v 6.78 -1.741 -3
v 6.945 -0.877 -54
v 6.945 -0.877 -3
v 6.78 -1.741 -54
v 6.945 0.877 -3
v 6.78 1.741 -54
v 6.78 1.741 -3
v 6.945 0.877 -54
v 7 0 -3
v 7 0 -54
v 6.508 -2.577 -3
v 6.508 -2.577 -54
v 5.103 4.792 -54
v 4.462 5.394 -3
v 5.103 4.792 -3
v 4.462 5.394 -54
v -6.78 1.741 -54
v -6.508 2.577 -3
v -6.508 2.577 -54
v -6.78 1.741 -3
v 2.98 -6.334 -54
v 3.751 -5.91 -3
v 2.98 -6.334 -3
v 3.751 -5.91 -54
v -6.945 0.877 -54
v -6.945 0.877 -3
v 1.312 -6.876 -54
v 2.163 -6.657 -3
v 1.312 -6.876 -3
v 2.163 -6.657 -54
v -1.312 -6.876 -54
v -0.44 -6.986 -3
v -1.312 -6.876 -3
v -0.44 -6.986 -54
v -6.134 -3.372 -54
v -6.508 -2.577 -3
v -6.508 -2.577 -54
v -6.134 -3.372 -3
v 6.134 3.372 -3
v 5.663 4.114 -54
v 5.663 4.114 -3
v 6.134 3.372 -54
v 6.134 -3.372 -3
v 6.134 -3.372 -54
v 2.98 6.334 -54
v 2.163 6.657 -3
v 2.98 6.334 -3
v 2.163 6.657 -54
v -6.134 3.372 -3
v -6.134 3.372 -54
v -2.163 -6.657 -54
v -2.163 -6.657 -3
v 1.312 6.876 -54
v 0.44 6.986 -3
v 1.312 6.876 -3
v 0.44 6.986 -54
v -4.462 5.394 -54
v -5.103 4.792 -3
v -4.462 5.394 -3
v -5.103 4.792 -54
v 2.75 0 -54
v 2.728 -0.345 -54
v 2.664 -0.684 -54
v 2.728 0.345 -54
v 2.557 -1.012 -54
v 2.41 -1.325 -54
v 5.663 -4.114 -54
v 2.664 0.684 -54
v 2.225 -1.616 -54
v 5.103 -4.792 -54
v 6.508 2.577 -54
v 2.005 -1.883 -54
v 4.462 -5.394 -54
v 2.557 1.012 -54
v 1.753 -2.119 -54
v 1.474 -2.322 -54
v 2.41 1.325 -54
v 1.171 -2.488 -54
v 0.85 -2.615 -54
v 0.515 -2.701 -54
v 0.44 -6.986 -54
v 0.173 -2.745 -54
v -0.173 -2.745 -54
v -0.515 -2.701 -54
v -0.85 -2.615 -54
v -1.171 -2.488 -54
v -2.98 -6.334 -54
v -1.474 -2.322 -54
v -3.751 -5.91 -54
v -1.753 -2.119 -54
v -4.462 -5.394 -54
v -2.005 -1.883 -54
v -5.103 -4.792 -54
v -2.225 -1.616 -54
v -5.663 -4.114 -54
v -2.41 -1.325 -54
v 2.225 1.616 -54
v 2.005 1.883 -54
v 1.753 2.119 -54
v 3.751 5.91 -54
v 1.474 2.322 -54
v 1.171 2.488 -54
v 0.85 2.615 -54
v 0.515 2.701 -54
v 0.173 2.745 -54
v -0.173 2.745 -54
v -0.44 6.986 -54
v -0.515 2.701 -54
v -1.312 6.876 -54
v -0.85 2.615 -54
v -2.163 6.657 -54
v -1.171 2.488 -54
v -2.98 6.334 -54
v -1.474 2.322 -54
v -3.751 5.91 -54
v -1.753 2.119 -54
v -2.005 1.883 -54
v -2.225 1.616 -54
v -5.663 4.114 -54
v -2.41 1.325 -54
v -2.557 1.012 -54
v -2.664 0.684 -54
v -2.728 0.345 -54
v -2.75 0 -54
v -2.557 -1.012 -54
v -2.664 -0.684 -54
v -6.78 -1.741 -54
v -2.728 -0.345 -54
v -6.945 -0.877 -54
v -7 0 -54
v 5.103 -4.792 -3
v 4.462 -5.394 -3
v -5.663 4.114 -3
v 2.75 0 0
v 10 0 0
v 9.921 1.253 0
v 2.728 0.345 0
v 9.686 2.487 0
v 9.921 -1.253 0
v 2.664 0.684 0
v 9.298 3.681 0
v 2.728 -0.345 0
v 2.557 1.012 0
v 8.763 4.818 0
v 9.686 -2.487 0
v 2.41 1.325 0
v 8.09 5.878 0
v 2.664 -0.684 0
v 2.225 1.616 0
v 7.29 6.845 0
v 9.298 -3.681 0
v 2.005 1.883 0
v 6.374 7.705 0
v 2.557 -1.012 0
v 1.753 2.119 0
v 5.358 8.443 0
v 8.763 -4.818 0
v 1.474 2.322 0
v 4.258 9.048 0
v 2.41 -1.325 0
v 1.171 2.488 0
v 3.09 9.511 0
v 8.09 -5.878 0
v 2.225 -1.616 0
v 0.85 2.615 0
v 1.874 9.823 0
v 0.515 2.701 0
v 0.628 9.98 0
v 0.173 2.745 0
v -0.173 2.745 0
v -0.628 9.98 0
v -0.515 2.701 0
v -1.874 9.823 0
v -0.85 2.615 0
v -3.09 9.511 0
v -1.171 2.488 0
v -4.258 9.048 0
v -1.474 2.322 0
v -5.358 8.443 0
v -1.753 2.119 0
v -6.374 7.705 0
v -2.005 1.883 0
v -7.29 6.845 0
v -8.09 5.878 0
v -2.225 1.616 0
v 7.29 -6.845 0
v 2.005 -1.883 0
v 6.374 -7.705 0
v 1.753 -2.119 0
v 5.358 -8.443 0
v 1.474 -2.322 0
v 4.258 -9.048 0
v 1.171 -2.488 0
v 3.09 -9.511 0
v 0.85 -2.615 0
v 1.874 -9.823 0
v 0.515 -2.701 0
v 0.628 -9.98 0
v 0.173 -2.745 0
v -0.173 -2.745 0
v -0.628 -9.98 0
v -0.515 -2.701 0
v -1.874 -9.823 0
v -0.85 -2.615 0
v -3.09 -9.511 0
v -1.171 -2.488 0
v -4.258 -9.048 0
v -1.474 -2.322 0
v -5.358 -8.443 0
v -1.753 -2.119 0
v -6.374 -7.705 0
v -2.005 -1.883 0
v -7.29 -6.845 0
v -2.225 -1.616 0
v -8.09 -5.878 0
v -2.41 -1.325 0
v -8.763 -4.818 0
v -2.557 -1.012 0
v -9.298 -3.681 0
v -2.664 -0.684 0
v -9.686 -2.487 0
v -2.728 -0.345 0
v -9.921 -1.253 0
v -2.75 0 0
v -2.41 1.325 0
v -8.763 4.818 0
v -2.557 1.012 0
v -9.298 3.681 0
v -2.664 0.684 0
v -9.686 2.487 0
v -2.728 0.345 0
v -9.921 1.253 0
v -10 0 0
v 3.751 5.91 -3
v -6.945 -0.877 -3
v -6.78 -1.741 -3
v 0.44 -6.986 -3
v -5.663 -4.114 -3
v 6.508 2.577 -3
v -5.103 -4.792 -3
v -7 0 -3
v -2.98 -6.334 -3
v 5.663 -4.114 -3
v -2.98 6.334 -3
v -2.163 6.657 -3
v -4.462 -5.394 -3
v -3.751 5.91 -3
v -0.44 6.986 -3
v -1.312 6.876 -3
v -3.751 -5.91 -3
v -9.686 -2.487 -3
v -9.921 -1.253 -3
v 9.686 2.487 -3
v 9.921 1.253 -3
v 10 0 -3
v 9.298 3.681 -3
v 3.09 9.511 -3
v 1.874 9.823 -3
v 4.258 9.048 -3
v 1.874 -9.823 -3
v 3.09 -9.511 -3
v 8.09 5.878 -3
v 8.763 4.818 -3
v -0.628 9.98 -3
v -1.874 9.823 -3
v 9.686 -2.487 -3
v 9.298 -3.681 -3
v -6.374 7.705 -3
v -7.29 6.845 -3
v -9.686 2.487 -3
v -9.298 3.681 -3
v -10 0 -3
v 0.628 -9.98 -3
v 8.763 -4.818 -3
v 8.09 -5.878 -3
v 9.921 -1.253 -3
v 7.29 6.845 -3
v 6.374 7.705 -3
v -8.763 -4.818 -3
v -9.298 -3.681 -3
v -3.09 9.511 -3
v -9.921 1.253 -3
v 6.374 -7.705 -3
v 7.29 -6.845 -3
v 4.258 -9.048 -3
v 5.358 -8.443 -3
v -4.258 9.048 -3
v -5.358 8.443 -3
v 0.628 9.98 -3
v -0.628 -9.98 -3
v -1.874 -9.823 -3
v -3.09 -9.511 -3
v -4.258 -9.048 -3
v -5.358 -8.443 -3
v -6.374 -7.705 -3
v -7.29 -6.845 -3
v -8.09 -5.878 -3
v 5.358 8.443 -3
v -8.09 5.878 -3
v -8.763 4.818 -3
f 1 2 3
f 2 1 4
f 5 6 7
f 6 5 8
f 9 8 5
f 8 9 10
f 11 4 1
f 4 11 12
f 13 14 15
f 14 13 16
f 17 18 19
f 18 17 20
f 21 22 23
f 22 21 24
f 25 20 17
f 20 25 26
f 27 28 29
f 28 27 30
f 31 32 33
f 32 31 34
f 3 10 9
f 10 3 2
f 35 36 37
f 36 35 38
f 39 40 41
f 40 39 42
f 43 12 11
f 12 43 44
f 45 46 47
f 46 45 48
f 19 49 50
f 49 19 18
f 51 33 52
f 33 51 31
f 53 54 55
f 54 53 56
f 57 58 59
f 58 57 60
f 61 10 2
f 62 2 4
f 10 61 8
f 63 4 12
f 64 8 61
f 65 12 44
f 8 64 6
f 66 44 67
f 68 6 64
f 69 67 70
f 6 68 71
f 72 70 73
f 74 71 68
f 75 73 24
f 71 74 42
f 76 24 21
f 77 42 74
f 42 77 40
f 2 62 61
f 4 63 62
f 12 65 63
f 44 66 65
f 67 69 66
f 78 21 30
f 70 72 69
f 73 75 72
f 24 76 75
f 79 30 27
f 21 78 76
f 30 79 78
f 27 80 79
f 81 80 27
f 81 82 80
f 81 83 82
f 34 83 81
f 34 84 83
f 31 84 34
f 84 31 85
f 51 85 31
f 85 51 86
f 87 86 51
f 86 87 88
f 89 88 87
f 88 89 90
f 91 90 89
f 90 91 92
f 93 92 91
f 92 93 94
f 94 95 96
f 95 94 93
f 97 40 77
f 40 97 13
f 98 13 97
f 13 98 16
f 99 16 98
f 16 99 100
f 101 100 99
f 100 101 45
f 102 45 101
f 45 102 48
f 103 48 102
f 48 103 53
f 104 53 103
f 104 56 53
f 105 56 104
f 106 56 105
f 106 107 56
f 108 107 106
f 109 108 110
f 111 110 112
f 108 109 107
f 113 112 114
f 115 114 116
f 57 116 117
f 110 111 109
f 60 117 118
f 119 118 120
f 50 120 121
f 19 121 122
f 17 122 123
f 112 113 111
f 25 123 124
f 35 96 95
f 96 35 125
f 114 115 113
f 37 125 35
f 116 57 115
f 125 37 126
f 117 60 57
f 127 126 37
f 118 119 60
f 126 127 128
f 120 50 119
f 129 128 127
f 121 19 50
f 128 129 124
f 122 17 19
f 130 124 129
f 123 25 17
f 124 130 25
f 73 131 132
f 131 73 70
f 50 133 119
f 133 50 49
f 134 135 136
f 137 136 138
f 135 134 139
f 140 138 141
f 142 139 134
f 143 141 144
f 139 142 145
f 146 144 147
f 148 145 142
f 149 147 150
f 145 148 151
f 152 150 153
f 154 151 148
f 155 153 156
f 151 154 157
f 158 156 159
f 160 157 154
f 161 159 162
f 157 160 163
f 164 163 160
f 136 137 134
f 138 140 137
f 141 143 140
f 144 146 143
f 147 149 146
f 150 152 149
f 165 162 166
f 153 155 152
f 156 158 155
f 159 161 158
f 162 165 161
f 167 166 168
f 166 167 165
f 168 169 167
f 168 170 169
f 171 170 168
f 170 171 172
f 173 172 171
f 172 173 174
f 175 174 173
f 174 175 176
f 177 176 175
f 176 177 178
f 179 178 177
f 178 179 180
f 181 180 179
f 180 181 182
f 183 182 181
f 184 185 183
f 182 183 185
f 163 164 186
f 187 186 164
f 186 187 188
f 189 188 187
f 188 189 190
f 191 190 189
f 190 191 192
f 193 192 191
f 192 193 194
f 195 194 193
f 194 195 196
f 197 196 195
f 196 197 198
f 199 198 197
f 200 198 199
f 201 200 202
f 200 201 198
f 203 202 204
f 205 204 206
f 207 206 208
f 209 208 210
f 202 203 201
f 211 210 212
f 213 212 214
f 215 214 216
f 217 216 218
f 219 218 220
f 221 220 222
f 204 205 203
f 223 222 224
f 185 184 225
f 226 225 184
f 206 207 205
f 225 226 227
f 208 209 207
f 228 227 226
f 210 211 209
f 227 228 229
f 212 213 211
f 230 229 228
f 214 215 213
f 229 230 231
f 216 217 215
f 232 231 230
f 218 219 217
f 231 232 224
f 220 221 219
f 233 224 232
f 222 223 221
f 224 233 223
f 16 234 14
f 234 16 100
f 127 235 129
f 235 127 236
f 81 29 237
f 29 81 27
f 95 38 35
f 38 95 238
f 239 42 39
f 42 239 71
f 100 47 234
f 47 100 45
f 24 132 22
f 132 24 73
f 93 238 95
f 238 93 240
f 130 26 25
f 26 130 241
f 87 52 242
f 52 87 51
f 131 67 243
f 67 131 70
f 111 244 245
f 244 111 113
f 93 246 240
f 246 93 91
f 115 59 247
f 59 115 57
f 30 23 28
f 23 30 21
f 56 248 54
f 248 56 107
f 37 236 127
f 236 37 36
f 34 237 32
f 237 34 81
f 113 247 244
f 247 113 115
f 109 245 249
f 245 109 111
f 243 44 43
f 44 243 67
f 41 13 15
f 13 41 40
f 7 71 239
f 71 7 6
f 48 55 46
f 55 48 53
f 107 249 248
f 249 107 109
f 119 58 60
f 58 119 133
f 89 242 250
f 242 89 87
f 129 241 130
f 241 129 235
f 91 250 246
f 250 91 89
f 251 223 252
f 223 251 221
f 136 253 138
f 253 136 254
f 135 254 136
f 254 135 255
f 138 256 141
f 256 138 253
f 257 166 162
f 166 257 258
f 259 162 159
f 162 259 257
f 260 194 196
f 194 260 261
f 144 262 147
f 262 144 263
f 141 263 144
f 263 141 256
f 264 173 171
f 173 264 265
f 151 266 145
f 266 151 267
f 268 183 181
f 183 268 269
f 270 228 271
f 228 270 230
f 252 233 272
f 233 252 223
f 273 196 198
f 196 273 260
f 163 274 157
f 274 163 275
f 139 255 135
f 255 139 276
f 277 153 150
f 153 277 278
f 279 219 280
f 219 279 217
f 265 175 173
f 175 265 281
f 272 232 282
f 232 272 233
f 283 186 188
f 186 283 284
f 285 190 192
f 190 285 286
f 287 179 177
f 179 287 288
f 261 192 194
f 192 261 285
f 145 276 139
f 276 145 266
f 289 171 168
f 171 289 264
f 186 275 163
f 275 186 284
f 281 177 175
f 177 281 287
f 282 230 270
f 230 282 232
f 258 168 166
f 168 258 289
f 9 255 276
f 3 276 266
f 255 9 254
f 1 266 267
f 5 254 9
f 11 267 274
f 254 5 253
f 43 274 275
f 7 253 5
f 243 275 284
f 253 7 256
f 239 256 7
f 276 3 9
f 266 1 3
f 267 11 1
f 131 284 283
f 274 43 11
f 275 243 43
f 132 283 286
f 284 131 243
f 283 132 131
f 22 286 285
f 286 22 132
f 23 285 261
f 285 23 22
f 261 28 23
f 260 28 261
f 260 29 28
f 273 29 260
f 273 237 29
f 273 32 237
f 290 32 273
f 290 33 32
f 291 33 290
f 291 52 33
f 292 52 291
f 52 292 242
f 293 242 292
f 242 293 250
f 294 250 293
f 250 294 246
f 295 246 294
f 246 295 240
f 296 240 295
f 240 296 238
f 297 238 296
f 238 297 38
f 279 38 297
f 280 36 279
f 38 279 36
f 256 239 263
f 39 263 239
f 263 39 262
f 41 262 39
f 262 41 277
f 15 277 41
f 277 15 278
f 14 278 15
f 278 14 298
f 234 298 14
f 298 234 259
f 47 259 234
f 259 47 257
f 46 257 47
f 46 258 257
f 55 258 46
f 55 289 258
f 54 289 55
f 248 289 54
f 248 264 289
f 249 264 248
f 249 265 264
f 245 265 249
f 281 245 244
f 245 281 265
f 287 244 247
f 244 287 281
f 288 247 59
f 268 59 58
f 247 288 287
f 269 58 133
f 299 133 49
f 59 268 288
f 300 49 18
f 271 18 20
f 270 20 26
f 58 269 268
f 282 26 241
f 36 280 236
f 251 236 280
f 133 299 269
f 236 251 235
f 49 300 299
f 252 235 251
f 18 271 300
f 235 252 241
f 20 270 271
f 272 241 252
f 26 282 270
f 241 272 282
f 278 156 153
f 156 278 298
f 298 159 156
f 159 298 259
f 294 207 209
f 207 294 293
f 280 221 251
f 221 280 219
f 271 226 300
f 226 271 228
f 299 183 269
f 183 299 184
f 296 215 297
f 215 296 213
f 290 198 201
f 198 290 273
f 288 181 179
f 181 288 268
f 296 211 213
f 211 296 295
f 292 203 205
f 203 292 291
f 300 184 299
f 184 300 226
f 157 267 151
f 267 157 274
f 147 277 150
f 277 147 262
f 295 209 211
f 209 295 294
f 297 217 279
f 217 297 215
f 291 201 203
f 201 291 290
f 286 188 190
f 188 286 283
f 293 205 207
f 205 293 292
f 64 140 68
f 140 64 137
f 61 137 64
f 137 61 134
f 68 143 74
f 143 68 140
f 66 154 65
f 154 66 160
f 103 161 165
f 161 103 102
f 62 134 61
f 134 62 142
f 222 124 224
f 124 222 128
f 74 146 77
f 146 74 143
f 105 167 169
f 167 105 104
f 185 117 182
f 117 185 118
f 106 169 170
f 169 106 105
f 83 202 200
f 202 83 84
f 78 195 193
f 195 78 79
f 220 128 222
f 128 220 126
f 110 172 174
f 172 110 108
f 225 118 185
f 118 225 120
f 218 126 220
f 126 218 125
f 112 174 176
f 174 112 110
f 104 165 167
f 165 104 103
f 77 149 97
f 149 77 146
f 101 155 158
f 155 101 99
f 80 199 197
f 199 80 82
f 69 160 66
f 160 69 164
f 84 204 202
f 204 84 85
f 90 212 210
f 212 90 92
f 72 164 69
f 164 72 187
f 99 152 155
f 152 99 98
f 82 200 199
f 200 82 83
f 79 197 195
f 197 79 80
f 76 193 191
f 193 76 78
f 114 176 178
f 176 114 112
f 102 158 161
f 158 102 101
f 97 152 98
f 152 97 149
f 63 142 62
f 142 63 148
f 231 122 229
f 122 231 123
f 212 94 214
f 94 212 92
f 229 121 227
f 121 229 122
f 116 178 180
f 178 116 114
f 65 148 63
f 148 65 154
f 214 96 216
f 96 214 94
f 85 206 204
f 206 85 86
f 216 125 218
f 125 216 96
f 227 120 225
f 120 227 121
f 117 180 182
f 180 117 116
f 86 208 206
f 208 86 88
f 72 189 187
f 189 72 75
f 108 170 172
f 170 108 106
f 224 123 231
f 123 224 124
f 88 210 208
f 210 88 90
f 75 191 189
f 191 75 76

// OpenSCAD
$fn = 50;


difference() {
	union() {
		translate(v = [0, 0, -54.0000000000]) {
			cylinder(h = 54, r = 7.0000000000);
		}
		translate(v = [0, 0, -3.0000000000]) {
			cylinder(h = 3, r = 10.0000000000);
		}
	}
	union() {
		#translate(v = [0, 0, -54]) {
			cylinder(h = 54, r = 2.7500000000);
		}
	}
}
